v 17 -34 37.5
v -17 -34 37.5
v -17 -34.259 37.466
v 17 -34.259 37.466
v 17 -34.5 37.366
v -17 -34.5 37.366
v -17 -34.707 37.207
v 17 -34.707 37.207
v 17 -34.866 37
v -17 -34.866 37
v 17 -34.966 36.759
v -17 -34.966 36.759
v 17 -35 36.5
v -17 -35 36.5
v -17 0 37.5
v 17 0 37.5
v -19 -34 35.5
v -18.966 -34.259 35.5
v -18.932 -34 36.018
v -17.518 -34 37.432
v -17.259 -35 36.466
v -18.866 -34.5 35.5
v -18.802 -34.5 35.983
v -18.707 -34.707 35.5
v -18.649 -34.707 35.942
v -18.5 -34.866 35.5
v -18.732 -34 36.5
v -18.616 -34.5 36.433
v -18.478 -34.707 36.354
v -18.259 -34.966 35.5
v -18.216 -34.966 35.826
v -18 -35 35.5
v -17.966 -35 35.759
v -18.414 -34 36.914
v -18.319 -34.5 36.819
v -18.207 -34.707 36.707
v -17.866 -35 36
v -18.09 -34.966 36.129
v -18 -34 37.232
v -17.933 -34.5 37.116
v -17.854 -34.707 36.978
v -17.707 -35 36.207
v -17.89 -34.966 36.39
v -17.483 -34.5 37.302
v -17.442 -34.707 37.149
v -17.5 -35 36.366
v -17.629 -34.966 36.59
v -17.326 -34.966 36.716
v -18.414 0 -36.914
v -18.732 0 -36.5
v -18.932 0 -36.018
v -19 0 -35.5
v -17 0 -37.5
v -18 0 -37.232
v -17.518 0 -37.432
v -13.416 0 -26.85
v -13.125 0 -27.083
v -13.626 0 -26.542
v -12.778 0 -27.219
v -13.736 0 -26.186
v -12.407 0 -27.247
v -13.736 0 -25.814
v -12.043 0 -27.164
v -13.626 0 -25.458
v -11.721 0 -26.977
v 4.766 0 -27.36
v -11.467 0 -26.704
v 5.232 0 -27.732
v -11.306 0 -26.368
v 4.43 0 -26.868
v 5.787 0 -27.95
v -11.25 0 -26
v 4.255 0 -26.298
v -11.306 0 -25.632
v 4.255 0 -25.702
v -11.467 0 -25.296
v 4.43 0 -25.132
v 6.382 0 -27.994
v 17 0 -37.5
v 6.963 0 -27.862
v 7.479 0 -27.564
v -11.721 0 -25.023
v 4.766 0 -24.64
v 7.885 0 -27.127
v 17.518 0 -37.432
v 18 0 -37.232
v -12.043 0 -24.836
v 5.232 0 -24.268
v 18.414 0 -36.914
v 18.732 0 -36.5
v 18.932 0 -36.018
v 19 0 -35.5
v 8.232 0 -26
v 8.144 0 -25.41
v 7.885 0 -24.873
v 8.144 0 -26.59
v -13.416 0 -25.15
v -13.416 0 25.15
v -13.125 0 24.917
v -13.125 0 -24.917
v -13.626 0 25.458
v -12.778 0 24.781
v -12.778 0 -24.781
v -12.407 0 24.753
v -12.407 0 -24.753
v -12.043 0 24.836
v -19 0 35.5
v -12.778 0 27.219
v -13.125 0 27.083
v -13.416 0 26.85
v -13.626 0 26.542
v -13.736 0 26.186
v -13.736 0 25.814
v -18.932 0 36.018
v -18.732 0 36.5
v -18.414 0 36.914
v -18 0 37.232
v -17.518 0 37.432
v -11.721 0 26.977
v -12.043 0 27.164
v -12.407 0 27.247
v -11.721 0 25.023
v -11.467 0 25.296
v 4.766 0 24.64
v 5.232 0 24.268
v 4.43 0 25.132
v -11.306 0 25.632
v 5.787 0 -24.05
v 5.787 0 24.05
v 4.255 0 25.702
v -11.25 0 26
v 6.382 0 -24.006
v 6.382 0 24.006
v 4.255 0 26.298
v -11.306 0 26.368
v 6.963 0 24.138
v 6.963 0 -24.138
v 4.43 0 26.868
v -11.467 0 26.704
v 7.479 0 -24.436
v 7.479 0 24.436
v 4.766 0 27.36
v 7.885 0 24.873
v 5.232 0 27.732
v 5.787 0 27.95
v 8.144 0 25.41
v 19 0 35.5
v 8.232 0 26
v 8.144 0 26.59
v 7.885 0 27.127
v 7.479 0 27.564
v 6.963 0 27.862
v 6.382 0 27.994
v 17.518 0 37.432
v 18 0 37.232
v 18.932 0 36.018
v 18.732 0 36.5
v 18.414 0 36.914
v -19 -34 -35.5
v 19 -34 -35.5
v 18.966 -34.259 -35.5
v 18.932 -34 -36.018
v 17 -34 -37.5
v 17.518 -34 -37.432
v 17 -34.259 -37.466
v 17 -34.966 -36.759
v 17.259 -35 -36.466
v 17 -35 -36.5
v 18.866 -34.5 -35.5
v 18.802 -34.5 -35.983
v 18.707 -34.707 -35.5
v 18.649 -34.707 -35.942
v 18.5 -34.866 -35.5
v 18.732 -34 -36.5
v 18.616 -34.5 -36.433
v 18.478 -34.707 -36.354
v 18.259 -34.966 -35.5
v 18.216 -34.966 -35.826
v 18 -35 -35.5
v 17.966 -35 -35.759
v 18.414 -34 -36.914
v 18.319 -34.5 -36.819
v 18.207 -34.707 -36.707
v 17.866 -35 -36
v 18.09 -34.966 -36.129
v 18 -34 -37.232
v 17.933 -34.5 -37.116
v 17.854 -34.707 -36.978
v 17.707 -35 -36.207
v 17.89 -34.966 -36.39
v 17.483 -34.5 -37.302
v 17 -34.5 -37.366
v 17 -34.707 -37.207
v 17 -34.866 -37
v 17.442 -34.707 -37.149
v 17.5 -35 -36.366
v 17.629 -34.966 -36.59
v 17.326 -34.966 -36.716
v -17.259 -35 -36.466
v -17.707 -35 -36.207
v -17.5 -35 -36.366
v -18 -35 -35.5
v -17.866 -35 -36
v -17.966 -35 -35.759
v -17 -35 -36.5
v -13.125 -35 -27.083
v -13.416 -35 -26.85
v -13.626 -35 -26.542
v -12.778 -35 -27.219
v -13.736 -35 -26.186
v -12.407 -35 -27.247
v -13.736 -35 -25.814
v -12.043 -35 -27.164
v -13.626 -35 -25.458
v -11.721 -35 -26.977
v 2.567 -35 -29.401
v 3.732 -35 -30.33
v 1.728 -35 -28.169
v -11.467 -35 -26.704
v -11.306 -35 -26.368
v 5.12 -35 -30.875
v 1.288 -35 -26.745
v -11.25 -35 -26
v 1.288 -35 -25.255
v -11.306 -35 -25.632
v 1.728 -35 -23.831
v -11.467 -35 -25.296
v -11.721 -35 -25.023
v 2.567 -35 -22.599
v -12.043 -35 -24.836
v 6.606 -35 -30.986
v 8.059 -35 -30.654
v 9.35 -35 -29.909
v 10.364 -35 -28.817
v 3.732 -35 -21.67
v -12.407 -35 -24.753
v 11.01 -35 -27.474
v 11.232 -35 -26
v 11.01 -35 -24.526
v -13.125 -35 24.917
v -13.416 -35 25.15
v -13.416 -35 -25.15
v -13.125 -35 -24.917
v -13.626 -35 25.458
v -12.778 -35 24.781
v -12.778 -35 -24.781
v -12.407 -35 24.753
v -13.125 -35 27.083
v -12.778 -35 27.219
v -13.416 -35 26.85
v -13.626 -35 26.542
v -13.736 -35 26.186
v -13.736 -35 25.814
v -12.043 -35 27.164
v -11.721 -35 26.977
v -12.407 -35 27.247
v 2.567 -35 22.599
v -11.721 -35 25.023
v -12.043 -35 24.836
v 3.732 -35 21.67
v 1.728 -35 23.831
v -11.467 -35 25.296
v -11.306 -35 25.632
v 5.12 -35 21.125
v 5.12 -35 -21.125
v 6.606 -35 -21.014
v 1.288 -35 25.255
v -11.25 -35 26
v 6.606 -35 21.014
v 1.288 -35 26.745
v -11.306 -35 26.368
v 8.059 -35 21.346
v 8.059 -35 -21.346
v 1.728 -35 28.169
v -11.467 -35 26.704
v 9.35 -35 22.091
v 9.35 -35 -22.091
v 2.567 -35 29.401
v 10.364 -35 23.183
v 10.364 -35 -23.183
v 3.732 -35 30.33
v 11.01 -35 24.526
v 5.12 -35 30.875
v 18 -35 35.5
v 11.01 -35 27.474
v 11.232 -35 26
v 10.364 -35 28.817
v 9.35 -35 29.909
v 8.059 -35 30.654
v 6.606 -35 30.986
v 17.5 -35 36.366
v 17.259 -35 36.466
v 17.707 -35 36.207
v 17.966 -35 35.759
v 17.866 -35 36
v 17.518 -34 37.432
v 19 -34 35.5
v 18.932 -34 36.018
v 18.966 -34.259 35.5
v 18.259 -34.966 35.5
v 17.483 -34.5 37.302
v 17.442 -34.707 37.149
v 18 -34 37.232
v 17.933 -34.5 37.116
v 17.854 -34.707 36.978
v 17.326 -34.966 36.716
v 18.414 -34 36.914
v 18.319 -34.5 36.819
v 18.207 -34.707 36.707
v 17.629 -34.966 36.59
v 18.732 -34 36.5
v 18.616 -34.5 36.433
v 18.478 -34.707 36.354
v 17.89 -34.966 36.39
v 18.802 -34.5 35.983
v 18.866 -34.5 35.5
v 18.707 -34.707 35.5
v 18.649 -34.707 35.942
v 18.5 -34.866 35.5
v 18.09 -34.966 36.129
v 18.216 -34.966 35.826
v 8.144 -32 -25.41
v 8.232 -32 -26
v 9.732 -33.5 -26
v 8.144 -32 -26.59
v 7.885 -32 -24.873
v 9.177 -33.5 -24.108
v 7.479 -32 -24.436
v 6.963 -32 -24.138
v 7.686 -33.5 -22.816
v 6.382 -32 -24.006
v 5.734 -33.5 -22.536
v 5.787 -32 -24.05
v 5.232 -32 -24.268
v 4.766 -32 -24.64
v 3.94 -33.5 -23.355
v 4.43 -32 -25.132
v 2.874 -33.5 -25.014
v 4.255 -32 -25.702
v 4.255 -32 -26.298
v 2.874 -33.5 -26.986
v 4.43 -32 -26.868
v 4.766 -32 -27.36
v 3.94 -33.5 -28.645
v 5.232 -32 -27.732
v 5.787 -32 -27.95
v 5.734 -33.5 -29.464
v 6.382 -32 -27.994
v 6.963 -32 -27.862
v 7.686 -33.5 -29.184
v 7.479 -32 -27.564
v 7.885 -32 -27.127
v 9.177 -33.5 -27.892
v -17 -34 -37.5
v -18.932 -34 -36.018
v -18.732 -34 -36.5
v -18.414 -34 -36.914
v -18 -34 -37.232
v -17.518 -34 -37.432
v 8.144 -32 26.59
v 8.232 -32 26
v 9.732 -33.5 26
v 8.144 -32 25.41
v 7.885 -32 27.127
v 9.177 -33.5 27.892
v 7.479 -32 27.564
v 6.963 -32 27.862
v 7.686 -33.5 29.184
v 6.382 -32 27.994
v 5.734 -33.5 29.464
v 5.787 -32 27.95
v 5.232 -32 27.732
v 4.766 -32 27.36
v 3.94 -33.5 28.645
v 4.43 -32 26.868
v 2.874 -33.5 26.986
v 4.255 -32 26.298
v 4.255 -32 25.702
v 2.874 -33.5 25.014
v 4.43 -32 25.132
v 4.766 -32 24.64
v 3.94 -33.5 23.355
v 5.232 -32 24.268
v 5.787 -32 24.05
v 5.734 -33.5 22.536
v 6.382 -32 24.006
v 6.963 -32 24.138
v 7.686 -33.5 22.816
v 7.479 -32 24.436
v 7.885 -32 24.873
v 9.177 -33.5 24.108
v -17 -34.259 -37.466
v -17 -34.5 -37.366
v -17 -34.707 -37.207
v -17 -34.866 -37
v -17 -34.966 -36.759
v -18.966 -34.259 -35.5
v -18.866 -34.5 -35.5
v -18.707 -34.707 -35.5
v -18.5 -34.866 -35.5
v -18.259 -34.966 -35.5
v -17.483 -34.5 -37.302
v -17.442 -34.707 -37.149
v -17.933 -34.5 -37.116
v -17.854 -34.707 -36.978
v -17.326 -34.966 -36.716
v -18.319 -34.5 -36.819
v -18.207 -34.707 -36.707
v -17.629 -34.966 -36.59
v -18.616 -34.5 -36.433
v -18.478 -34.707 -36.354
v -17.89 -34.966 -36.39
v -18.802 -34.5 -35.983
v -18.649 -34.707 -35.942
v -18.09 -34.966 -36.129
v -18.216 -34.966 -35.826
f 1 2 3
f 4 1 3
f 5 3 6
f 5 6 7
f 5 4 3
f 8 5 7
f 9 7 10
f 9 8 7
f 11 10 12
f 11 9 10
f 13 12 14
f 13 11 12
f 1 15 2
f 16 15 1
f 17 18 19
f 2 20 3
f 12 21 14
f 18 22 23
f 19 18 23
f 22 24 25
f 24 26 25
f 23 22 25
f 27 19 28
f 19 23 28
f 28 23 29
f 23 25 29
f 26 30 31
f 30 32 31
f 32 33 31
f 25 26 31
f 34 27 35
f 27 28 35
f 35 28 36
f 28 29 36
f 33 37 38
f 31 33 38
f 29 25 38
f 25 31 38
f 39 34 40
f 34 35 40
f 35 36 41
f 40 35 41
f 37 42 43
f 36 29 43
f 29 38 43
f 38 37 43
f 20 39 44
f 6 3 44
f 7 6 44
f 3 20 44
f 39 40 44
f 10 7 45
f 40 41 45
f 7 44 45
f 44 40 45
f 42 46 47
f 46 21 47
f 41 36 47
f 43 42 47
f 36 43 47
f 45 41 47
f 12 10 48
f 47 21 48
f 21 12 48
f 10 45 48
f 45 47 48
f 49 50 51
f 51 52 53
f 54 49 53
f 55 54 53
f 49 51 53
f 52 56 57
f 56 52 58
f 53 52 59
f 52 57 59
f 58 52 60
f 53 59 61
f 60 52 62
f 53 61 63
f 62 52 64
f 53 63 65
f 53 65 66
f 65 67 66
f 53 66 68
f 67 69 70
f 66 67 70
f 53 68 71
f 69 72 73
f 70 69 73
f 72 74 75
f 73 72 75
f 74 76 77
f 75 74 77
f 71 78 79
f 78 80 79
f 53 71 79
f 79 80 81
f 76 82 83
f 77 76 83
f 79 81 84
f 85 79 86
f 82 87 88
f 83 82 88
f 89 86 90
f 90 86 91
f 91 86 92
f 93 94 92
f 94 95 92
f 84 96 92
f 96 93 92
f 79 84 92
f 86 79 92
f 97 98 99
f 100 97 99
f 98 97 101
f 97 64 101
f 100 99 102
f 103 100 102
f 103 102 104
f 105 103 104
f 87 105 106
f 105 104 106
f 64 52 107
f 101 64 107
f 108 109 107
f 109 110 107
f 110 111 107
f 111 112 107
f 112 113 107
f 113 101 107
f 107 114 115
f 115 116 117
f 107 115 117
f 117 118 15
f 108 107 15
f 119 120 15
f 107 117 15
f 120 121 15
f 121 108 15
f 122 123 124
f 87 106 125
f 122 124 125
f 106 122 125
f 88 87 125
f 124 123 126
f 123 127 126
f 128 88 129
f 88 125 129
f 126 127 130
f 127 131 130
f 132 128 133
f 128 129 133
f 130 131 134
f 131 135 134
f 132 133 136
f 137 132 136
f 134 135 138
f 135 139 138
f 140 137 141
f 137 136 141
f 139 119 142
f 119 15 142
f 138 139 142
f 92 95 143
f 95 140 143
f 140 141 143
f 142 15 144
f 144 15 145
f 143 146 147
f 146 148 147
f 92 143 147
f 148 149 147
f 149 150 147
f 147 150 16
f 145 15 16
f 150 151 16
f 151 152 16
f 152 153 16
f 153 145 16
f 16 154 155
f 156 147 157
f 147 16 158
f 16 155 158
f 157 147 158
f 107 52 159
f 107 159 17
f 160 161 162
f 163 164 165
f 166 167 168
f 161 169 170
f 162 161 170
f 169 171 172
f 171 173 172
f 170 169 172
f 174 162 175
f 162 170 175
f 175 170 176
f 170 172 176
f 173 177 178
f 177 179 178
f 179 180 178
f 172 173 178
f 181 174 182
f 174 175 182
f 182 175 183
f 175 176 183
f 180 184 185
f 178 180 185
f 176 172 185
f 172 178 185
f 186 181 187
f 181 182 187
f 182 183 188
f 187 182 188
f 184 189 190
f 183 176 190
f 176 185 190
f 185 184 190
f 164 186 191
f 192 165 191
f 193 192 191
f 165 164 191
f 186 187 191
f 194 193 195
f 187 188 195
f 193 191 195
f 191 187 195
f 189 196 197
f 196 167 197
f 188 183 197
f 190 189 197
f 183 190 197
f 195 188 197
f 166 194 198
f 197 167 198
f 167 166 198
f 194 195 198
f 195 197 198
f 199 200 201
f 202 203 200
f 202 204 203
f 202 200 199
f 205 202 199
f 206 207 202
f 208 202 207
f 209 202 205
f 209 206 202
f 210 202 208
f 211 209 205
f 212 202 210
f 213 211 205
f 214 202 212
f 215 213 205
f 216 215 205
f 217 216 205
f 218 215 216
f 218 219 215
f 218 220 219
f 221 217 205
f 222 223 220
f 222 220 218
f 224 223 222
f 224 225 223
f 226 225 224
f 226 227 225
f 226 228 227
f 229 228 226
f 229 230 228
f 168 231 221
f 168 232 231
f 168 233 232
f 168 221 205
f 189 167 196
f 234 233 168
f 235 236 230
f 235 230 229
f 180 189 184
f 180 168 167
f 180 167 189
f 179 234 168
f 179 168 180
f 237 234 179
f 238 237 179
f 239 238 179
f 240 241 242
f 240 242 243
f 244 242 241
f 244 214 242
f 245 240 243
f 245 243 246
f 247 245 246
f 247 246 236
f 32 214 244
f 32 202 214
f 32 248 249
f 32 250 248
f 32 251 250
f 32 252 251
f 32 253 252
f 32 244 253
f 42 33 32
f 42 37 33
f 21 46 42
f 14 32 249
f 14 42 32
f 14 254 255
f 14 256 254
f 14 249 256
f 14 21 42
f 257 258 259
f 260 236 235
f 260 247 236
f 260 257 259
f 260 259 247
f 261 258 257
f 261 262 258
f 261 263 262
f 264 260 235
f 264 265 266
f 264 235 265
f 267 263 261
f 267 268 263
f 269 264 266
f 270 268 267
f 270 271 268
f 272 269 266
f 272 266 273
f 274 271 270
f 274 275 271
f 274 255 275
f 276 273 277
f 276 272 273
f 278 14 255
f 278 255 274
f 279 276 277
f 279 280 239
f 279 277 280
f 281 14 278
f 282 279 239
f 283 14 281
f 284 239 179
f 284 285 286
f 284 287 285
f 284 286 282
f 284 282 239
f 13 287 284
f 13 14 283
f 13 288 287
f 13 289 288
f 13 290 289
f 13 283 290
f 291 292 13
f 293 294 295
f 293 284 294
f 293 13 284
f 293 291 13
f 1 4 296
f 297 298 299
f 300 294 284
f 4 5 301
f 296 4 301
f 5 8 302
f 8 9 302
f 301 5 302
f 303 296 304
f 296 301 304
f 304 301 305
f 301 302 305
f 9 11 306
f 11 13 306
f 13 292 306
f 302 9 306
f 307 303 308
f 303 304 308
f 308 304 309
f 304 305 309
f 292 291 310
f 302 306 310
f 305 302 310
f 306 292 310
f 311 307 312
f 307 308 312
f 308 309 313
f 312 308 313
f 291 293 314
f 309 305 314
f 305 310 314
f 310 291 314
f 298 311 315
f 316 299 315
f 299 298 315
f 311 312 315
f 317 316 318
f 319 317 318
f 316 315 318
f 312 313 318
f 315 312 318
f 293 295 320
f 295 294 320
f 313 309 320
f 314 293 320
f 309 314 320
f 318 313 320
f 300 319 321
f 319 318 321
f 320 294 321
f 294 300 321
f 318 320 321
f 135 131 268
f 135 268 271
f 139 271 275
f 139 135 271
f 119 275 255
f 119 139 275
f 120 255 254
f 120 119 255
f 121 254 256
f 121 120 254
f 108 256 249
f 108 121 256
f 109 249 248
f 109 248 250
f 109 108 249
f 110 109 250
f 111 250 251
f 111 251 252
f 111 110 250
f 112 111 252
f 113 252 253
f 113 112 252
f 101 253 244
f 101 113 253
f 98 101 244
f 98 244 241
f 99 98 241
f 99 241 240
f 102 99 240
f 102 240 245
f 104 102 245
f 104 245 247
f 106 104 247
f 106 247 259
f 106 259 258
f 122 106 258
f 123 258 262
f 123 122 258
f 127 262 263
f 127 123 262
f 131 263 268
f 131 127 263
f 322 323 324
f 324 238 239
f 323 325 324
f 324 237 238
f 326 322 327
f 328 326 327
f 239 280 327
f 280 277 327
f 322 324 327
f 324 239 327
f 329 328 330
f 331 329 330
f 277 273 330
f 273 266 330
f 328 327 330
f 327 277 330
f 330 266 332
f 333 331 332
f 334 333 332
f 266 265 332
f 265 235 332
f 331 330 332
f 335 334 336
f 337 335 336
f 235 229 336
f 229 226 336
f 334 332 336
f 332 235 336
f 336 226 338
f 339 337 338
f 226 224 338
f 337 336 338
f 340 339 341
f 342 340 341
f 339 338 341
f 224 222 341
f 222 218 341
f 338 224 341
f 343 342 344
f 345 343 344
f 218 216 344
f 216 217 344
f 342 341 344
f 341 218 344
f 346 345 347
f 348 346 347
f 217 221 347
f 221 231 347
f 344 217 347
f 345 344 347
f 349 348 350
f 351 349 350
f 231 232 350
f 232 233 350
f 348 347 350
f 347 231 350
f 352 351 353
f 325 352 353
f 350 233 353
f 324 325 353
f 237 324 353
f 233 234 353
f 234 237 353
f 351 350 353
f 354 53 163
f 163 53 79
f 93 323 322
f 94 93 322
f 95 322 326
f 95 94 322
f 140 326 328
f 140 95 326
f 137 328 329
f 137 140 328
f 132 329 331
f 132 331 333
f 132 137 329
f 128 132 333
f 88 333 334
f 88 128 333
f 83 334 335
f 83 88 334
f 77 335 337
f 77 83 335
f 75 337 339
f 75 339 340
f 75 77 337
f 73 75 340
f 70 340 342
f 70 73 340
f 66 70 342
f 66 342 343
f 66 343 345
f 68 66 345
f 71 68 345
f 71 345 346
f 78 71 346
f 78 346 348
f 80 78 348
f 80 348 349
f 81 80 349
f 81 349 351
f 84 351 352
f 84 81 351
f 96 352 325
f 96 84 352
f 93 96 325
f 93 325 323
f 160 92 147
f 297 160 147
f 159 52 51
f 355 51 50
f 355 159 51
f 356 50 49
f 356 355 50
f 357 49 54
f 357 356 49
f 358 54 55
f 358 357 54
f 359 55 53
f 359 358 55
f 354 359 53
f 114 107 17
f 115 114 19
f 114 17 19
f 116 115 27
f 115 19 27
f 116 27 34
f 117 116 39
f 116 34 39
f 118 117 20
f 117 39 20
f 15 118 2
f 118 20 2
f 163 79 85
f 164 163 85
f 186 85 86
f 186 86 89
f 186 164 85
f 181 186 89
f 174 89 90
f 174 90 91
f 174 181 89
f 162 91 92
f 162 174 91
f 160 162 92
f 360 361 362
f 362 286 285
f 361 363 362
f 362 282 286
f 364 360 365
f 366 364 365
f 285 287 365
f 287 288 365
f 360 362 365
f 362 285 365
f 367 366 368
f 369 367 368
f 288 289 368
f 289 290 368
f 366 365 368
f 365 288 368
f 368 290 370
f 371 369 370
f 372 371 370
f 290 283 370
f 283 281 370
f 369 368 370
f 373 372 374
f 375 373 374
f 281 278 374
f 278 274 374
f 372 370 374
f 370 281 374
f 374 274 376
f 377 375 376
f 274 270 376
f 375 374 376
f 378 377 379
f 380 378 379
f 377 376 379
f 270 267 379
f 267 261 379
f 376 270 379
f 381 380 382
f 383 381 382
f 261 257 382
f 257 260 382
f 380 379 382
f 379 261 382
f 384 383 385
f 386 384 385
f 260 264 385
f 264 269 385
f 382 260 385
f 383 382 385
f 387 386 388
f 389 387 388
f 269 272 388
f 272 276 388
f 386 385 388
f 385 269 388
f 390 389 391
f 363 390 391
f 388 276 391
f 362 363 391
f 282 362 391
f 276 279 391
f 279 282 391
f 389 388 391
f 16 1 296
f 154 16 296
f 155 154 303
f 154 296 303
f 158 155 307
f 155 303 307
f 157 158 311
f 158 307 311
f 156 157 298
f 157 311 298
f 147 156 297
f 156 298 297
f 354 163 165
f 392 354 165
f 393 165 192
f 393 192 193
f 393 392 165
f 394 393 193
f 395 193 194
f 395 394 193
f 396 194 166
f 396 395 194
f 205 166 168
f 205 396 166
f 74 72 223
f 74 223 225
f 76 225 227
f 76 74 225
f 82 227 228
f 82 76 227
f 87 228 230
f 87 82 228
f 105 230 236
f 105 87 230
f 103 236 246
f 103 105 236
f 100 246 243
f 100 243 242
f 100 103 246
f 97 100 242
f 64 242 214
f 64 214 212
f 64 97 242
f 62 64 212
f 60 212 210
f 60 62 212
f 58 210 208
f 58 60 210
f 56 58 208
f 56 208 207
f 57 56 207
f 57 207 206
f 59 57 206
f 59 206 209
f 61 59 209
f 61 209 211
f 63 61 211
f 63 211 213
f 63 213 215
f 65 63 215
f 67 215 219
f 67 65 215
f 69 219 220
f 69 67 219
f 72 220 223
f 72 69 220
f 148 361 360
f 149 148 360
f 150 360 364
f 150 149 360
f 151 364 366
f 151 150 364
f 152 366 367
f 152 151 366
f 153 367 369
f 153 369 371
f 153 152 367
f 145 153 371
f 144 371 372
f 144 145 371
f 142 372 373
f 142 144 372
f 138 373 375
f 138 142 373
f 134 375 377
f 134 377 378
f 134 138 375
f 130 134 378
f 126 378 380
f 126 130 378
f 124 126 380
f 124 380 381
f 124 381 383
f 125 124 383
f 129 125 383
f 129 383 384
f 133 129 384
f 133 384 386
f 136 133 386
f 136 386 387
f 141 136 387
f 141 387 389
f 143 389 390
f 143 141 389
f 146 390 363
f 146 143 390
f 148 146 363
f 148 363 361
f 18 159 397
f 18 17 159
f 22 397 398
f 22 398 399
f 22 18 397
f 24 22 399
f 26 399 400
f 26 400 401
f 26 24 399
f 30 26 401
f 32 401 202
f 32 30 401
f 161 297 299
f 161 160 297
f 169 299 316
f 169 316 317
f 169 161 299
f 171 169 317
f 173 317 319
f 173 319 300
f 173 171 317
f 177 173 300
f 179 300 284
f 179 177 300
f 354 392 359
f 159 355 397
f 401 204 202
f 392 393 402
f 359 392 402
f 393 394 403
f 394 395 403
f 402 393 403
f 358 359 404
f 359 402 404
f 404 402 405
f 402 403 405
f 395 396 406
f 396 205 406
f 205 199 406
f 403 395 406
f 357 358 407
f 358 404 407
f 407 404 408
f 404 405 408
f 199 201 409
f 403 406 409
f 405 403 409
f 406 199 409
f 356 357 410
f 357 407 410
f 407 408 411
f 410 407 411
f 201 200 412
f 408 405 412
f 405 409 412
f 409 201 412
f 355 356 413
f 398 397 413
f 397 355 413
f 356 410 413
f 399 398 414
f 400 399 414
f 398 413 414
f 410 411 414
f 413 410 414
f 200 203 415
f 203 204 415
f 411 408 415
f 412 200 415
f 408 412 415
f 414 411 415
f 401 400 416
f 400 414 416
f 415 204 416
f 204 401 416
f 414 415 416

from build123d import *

# Parameters (mm, degrees)
F0_W     = 38
F0_H     = 75
F0_R     = 1.25
F0_R_2   = 2
F1_DEPTH = 35
F2_SIZE2 = 3
F2_SIZE  = 3
F3_R     = 2
F4_R     = 1


with BuildPart() as f1:
    # F0 (on Front) → F1 (new body)
    with BuildSketch(Plane.XZ):
        Rectangle(F0_W, F0_H)
        with Locations((-12.5, -26)):
            Circle(F0_R, mode=Mode.SUBTRACT)
        with Locations((6.232371, -26)):
            Circle(F0_R_2, mode=Mode.SUBTRACT)
        with Locations((-12.5, 26)):
            Circle(F0_R, mode=Mode.SUBTRACT)
        with Locations((6.232371, 26)):
            Circle(F0_R_2, mode=Mode.SUBTRACT)
    extrude(amount=F1_DEPTH)

    # F2
    f2_edges = [f1.edges().sort_by_distance(p)[0] for p in [
        (4.232371, -35, 26),
        (4.232371, -35, -26),
    ]]
    chamfer(f2_edges, length=F2_SIZE, length2=F2_SIZE2)

    # F3
    f3_edges = [f1.edges().sort_by_distance(p)[0] for p in [
        (-19, -17.5, 37.5),
        (-19, -17.5, -37.5),
        (19, -17.5, -37.5),
        (19, -17.5, 37.5),
    ]]
    fillet(f3_edges, radius=F3_R)

    # F4
    f4_edges = [f1.edges().sort_by_distance(p)[0] for p in [
        (-19, -35, 0),
    ]]
    fillet(f4_edges, radius=F4_R)


solid = f1.part
